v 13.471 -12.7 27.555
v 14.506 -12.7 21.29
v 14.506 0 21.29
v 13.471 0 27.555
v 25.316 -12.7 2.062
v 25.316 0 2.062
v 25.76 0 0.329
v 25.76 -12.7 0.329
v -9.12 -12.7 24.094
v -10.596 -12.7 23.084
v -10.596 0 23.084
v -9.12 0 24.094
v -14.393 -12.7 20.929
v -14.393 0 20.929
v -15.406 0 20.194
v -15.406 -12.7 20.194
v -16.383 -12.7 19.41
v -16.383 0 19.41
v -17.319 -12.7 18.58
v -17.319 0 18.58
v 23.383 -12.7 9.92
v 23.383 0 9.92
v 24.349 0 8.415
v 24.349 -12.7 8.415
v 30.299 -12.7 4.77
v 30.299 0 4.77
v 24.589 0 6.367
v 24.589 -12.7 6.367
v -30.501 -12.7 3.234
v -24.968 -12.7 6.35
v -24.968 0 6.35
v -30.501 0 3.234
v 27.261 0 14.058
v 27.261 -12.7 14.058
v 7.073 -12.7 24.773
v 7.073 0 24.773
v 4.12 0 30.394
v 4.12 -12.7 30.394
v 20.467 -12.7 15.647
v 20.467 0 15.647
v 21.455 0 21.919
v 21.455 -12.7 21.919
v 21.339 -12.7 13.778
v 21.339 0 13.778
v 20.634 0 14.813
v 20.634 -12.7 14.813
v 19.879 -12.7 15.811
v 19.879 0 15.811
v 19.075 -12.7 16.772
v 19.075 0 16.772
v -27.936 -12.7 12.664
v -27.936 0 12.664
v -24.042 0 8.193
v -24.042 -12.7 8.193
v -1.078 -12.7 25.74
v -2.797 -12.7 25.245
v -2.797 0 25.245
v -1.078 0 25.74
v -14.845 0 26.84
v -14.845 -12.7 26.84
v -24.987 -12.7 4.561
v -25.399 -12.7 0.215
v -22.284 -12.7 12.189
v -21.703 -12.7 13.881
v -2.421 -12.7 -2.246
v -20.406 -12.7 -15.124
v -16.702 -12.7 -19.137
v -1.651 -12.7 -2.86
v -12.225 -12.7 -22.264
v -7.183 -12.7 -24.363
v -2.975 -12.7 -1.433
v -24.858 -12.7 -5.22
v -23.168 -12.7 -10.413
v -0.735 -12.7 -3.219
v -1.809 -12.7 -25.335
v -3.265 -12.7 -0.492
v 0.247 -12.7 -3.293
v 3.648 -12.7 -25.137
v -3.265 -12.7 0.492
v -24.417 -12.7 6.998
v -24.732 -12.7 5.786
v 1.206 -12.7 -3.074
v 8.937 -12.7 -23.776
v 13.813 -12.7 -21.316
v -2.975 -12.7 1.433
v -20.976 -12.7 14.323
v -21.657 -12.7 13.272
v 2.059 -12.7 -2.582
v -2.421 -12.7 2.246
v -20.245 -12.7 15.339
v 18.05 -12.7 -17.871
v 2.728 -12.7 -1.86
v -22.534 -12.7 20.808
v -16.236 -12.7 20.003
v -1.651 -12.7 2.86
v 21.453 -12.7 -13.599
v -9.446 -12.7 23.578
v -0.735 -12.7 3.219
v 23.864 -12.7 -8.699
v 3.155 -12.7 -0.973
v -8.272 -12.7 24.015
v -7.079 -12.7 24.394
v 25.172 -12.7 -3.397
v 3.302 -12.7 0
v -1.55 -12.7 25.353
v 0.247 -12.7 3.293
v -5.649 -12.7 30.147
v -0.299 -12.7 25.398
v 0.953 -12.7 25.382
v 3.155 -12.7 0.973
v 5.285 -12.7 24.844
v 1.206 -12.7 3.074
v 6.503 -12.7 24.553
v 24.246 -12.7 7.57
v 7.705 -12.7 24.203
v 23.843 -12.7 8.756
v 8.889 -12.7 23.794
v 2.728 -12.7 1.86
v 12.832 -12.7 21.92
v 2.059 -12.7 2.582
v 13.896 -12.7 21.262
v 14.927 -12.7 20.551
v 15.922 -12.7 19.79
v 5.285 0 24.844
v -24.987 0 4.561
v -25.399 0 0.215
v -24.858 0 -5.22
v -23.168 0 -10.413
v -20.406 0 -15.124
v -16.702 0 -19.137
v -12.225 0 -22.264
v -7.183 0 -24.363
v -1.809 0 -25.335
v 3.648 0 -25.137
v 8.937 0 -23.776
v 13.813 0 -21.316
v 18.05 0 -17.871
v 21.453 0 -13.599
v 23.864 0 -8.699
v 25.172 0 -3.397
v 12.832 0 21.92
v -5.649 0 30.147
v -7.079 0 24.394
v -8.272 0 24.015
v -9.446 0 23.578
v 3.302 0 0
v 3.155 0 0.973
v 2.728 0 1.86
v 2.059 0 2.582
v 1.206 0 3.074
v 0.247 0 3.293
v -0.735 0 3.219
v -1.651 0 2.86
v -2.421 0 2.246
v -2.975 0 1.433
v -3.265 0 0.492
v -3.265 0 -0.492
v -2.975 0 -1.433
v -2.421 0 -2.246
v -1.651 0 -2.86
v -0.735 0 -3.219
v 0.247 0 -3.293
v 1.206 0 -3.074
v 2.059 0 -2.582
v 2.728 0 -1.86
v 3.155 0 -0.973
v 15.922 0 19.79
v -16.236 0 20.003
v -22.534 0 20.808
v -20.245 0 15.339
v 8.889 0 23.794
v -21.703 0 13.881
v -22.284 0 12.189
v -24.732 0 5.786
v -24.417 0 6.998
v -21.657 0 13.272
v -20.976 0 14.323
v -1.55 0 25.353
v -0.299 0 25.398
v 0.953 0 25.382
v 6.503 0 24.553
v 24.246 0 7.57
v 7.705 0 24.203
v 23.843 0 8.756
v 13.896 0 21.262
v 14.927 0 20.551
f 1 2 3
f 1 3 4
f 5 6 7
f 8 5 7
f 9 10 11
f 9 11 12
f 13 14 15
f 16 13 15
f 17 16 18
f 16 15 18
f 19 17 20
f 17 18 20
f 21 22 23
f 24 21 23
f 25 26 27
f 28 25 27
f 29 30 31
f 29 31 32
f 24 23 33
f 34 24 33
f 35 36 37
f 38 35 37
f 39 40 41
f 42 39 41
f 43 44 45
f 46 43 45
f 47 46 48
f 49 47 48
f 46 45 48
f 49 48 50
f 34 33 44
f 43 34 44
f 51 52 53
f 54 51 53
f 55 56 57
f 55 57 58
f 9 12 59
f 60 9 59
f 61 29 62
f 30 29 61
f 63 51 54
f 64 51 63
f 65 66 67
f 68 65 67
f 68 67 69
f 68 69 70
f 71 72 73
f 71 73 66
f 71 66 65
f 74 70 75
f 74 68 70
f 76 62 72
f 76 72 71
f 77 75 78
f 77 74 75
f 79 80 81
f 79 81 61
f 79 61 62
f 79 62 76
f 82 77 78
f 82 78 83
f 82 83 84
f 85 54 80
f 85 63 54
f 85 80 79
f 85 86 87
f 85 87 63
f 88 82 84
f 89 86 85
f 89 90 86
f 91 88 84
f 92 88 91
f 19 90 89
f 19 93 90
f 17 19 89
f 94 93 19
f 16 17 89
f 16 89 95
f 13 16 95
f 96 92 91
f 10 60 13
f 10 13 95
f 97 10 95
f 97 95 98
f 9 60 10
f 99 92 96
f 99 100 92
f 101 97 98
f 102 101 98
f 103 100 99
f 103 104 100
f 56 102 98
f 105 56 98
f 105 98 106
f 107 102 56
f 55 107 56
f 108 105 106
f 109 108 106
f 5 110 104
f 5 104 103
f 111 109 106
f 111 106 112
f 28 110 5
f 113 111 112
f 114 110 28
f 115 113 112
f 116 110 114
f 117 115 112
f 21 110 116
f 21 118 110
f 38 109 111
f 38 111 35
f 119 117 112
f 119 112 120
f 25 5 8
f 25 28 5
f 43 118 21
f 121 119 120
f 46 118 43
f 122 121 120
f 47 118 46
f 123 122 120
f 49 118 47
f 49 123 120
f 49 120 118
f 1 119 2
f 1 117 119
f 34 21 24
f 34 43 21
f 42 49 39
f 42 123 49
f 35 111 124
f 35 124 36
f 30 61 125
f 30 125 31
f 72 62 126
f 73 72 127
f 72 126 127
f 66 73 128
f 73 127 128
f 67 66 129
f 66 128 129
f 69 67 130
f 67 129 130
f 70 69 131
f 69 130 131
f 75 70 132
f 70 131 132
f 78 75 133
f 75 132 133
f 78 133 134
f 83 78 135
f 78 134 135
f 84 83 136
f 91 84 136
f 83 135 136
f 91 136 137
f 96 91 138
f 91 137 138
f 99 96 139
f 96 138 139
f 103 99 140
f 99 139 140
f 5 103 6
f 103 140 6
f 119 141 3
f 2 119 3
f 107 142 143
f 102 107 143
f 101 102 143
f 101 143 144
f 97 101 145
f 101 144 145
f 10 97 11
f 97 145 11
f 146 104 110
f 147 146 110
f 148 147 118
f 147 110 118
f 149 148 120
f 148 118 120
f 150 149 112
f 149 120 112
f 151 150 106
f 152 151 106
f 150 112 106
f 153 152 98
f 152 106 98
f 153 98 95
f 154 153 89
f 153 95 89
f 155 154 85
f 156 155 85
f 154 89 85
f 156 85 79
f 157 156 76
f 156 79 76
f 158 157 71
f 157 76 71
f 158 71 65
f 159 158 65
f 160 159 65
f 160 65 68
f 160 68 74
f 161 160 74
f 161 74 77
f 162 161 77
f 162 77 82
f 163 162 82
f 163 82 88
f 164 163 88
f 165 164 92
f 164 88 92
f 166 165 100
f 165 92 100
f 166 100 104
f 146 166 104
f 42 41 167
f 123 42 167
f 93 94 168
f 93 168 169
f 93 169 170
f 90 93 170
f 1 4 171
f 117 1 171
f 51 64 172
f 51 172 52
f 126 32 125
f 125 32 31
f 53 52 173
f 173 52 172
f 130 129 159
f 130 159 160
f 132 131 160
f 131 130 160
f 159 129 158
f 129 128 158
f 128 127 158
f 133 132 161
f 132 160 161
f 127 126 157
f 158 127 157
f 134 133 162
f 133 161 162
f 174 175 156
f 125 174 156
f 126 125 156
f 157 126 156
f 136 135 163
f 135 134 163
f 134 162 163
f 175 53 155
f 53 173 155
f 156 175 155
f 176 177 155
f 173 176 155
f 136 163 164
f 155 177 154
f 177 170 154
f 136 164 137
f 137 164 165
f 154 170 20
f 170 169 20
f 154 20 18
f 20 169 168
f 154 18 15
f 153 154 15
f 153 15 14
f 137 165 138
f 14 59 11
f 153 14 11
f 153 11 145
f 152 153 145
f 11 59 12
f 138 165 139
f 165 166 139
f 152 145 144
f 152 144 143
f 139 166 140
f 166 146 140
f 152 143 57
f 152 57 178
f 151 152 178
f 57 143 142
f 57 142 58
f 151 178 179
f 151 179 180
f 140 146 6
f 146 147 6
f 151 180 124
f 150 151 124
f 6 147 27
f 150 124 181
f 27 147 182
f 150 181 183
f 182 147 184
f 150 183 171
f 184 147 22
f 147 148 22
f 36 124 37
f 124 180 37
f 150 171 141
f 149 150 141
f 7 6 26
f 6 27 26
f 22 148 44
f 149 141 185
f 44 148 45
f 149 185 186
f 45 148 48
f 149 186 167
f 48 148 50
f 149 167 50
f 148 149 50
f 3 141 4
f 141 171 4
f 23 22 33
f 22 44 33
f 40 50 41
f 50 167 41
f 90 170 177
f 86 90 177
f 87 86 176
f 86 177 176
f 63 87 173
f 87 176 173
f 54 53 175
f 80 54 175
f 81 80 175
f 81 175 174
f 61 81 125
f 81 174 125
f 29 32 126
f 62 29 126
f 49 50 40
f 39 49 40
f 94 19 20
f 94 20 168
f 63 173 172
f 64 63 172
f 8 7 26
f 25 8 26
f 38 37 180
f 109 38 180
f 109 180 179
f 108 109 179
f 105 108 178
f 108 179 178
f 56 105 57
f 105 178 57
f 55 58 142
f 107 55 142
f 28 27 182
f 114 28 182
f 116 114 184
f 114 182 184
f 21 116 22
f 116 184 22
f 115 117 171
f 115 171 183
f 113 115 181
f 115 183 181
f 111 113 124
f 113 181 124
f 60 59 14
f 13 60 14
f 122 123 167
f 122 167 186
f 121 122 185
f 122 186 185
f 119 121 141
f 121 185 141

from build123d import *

# Parameters (mm, degrees)
F0_R     = 25.4
F1_DEPTH = 12.7
F3_DEPTH = 12.7
F4_R     = 3.302
F5_DEPTH = 12.7


with BuildPart() as f1:
    # F0 (on Front) → F1 (new body)
    with BuildSketch(Plane.XZ):
        Circle(F0_R)
    extrude(amount=F1_DEPTH)

    # F2 (on Front) → F3 (join)
    with BuildSketch(Plane.XZ):
        Polygon((-21.703257, 13.880826), (-27.935632, 12.664274), (-23.76588, 7.875155), align=None)
        Polygon((-30.501175, 3.234462), (-25.036675, 0), (-24.967798, 6.349626), align=None)
        Polygon((-16.235516, 20.002918), (-22.534213, 20.808476), (-20.082498, 14.950866), align=None)
        Polygon((-9.119631, 24.094419), (-14.845239, 26.840311), (-14.360447, 20.508844), align=None)
        Polygon((-1.07797, 25.739982), (-5.649254, 30.14746), (-7.180599, 23.984872), align=None)
        Polygon((7.073122, 24.772559), (4.120212, 30.394198), (0.728185, 25.026084), align=None)
        Polygon((14.506187, 21.290356), (13.471417, 27.555477), (8.563047, 23.526779), align=None)
        Polygon((20.466661, 15.646868), (21.455074, 21.919471), (15.528635, 19.63916), align=None)
        Polygon((24.349468, 8.414994), (27.260726, 14.058315), (20.917837, 13.757878), align=None)
        Polygon((25.760446, 0.328874), (30.299013, 4.770034), (24.183571, 6.479968), align=None)
    extrude(amount=F3_DEPTH)

    # F4 (on face) → F5 (cut)
    with BuildSketch(Plane.XZ.offset(12.7)):
        Circle(F4_R)
    extrude(amount=-F5_DEPTH, mode=Mode.SUBTRACT)


solid = f1.part
